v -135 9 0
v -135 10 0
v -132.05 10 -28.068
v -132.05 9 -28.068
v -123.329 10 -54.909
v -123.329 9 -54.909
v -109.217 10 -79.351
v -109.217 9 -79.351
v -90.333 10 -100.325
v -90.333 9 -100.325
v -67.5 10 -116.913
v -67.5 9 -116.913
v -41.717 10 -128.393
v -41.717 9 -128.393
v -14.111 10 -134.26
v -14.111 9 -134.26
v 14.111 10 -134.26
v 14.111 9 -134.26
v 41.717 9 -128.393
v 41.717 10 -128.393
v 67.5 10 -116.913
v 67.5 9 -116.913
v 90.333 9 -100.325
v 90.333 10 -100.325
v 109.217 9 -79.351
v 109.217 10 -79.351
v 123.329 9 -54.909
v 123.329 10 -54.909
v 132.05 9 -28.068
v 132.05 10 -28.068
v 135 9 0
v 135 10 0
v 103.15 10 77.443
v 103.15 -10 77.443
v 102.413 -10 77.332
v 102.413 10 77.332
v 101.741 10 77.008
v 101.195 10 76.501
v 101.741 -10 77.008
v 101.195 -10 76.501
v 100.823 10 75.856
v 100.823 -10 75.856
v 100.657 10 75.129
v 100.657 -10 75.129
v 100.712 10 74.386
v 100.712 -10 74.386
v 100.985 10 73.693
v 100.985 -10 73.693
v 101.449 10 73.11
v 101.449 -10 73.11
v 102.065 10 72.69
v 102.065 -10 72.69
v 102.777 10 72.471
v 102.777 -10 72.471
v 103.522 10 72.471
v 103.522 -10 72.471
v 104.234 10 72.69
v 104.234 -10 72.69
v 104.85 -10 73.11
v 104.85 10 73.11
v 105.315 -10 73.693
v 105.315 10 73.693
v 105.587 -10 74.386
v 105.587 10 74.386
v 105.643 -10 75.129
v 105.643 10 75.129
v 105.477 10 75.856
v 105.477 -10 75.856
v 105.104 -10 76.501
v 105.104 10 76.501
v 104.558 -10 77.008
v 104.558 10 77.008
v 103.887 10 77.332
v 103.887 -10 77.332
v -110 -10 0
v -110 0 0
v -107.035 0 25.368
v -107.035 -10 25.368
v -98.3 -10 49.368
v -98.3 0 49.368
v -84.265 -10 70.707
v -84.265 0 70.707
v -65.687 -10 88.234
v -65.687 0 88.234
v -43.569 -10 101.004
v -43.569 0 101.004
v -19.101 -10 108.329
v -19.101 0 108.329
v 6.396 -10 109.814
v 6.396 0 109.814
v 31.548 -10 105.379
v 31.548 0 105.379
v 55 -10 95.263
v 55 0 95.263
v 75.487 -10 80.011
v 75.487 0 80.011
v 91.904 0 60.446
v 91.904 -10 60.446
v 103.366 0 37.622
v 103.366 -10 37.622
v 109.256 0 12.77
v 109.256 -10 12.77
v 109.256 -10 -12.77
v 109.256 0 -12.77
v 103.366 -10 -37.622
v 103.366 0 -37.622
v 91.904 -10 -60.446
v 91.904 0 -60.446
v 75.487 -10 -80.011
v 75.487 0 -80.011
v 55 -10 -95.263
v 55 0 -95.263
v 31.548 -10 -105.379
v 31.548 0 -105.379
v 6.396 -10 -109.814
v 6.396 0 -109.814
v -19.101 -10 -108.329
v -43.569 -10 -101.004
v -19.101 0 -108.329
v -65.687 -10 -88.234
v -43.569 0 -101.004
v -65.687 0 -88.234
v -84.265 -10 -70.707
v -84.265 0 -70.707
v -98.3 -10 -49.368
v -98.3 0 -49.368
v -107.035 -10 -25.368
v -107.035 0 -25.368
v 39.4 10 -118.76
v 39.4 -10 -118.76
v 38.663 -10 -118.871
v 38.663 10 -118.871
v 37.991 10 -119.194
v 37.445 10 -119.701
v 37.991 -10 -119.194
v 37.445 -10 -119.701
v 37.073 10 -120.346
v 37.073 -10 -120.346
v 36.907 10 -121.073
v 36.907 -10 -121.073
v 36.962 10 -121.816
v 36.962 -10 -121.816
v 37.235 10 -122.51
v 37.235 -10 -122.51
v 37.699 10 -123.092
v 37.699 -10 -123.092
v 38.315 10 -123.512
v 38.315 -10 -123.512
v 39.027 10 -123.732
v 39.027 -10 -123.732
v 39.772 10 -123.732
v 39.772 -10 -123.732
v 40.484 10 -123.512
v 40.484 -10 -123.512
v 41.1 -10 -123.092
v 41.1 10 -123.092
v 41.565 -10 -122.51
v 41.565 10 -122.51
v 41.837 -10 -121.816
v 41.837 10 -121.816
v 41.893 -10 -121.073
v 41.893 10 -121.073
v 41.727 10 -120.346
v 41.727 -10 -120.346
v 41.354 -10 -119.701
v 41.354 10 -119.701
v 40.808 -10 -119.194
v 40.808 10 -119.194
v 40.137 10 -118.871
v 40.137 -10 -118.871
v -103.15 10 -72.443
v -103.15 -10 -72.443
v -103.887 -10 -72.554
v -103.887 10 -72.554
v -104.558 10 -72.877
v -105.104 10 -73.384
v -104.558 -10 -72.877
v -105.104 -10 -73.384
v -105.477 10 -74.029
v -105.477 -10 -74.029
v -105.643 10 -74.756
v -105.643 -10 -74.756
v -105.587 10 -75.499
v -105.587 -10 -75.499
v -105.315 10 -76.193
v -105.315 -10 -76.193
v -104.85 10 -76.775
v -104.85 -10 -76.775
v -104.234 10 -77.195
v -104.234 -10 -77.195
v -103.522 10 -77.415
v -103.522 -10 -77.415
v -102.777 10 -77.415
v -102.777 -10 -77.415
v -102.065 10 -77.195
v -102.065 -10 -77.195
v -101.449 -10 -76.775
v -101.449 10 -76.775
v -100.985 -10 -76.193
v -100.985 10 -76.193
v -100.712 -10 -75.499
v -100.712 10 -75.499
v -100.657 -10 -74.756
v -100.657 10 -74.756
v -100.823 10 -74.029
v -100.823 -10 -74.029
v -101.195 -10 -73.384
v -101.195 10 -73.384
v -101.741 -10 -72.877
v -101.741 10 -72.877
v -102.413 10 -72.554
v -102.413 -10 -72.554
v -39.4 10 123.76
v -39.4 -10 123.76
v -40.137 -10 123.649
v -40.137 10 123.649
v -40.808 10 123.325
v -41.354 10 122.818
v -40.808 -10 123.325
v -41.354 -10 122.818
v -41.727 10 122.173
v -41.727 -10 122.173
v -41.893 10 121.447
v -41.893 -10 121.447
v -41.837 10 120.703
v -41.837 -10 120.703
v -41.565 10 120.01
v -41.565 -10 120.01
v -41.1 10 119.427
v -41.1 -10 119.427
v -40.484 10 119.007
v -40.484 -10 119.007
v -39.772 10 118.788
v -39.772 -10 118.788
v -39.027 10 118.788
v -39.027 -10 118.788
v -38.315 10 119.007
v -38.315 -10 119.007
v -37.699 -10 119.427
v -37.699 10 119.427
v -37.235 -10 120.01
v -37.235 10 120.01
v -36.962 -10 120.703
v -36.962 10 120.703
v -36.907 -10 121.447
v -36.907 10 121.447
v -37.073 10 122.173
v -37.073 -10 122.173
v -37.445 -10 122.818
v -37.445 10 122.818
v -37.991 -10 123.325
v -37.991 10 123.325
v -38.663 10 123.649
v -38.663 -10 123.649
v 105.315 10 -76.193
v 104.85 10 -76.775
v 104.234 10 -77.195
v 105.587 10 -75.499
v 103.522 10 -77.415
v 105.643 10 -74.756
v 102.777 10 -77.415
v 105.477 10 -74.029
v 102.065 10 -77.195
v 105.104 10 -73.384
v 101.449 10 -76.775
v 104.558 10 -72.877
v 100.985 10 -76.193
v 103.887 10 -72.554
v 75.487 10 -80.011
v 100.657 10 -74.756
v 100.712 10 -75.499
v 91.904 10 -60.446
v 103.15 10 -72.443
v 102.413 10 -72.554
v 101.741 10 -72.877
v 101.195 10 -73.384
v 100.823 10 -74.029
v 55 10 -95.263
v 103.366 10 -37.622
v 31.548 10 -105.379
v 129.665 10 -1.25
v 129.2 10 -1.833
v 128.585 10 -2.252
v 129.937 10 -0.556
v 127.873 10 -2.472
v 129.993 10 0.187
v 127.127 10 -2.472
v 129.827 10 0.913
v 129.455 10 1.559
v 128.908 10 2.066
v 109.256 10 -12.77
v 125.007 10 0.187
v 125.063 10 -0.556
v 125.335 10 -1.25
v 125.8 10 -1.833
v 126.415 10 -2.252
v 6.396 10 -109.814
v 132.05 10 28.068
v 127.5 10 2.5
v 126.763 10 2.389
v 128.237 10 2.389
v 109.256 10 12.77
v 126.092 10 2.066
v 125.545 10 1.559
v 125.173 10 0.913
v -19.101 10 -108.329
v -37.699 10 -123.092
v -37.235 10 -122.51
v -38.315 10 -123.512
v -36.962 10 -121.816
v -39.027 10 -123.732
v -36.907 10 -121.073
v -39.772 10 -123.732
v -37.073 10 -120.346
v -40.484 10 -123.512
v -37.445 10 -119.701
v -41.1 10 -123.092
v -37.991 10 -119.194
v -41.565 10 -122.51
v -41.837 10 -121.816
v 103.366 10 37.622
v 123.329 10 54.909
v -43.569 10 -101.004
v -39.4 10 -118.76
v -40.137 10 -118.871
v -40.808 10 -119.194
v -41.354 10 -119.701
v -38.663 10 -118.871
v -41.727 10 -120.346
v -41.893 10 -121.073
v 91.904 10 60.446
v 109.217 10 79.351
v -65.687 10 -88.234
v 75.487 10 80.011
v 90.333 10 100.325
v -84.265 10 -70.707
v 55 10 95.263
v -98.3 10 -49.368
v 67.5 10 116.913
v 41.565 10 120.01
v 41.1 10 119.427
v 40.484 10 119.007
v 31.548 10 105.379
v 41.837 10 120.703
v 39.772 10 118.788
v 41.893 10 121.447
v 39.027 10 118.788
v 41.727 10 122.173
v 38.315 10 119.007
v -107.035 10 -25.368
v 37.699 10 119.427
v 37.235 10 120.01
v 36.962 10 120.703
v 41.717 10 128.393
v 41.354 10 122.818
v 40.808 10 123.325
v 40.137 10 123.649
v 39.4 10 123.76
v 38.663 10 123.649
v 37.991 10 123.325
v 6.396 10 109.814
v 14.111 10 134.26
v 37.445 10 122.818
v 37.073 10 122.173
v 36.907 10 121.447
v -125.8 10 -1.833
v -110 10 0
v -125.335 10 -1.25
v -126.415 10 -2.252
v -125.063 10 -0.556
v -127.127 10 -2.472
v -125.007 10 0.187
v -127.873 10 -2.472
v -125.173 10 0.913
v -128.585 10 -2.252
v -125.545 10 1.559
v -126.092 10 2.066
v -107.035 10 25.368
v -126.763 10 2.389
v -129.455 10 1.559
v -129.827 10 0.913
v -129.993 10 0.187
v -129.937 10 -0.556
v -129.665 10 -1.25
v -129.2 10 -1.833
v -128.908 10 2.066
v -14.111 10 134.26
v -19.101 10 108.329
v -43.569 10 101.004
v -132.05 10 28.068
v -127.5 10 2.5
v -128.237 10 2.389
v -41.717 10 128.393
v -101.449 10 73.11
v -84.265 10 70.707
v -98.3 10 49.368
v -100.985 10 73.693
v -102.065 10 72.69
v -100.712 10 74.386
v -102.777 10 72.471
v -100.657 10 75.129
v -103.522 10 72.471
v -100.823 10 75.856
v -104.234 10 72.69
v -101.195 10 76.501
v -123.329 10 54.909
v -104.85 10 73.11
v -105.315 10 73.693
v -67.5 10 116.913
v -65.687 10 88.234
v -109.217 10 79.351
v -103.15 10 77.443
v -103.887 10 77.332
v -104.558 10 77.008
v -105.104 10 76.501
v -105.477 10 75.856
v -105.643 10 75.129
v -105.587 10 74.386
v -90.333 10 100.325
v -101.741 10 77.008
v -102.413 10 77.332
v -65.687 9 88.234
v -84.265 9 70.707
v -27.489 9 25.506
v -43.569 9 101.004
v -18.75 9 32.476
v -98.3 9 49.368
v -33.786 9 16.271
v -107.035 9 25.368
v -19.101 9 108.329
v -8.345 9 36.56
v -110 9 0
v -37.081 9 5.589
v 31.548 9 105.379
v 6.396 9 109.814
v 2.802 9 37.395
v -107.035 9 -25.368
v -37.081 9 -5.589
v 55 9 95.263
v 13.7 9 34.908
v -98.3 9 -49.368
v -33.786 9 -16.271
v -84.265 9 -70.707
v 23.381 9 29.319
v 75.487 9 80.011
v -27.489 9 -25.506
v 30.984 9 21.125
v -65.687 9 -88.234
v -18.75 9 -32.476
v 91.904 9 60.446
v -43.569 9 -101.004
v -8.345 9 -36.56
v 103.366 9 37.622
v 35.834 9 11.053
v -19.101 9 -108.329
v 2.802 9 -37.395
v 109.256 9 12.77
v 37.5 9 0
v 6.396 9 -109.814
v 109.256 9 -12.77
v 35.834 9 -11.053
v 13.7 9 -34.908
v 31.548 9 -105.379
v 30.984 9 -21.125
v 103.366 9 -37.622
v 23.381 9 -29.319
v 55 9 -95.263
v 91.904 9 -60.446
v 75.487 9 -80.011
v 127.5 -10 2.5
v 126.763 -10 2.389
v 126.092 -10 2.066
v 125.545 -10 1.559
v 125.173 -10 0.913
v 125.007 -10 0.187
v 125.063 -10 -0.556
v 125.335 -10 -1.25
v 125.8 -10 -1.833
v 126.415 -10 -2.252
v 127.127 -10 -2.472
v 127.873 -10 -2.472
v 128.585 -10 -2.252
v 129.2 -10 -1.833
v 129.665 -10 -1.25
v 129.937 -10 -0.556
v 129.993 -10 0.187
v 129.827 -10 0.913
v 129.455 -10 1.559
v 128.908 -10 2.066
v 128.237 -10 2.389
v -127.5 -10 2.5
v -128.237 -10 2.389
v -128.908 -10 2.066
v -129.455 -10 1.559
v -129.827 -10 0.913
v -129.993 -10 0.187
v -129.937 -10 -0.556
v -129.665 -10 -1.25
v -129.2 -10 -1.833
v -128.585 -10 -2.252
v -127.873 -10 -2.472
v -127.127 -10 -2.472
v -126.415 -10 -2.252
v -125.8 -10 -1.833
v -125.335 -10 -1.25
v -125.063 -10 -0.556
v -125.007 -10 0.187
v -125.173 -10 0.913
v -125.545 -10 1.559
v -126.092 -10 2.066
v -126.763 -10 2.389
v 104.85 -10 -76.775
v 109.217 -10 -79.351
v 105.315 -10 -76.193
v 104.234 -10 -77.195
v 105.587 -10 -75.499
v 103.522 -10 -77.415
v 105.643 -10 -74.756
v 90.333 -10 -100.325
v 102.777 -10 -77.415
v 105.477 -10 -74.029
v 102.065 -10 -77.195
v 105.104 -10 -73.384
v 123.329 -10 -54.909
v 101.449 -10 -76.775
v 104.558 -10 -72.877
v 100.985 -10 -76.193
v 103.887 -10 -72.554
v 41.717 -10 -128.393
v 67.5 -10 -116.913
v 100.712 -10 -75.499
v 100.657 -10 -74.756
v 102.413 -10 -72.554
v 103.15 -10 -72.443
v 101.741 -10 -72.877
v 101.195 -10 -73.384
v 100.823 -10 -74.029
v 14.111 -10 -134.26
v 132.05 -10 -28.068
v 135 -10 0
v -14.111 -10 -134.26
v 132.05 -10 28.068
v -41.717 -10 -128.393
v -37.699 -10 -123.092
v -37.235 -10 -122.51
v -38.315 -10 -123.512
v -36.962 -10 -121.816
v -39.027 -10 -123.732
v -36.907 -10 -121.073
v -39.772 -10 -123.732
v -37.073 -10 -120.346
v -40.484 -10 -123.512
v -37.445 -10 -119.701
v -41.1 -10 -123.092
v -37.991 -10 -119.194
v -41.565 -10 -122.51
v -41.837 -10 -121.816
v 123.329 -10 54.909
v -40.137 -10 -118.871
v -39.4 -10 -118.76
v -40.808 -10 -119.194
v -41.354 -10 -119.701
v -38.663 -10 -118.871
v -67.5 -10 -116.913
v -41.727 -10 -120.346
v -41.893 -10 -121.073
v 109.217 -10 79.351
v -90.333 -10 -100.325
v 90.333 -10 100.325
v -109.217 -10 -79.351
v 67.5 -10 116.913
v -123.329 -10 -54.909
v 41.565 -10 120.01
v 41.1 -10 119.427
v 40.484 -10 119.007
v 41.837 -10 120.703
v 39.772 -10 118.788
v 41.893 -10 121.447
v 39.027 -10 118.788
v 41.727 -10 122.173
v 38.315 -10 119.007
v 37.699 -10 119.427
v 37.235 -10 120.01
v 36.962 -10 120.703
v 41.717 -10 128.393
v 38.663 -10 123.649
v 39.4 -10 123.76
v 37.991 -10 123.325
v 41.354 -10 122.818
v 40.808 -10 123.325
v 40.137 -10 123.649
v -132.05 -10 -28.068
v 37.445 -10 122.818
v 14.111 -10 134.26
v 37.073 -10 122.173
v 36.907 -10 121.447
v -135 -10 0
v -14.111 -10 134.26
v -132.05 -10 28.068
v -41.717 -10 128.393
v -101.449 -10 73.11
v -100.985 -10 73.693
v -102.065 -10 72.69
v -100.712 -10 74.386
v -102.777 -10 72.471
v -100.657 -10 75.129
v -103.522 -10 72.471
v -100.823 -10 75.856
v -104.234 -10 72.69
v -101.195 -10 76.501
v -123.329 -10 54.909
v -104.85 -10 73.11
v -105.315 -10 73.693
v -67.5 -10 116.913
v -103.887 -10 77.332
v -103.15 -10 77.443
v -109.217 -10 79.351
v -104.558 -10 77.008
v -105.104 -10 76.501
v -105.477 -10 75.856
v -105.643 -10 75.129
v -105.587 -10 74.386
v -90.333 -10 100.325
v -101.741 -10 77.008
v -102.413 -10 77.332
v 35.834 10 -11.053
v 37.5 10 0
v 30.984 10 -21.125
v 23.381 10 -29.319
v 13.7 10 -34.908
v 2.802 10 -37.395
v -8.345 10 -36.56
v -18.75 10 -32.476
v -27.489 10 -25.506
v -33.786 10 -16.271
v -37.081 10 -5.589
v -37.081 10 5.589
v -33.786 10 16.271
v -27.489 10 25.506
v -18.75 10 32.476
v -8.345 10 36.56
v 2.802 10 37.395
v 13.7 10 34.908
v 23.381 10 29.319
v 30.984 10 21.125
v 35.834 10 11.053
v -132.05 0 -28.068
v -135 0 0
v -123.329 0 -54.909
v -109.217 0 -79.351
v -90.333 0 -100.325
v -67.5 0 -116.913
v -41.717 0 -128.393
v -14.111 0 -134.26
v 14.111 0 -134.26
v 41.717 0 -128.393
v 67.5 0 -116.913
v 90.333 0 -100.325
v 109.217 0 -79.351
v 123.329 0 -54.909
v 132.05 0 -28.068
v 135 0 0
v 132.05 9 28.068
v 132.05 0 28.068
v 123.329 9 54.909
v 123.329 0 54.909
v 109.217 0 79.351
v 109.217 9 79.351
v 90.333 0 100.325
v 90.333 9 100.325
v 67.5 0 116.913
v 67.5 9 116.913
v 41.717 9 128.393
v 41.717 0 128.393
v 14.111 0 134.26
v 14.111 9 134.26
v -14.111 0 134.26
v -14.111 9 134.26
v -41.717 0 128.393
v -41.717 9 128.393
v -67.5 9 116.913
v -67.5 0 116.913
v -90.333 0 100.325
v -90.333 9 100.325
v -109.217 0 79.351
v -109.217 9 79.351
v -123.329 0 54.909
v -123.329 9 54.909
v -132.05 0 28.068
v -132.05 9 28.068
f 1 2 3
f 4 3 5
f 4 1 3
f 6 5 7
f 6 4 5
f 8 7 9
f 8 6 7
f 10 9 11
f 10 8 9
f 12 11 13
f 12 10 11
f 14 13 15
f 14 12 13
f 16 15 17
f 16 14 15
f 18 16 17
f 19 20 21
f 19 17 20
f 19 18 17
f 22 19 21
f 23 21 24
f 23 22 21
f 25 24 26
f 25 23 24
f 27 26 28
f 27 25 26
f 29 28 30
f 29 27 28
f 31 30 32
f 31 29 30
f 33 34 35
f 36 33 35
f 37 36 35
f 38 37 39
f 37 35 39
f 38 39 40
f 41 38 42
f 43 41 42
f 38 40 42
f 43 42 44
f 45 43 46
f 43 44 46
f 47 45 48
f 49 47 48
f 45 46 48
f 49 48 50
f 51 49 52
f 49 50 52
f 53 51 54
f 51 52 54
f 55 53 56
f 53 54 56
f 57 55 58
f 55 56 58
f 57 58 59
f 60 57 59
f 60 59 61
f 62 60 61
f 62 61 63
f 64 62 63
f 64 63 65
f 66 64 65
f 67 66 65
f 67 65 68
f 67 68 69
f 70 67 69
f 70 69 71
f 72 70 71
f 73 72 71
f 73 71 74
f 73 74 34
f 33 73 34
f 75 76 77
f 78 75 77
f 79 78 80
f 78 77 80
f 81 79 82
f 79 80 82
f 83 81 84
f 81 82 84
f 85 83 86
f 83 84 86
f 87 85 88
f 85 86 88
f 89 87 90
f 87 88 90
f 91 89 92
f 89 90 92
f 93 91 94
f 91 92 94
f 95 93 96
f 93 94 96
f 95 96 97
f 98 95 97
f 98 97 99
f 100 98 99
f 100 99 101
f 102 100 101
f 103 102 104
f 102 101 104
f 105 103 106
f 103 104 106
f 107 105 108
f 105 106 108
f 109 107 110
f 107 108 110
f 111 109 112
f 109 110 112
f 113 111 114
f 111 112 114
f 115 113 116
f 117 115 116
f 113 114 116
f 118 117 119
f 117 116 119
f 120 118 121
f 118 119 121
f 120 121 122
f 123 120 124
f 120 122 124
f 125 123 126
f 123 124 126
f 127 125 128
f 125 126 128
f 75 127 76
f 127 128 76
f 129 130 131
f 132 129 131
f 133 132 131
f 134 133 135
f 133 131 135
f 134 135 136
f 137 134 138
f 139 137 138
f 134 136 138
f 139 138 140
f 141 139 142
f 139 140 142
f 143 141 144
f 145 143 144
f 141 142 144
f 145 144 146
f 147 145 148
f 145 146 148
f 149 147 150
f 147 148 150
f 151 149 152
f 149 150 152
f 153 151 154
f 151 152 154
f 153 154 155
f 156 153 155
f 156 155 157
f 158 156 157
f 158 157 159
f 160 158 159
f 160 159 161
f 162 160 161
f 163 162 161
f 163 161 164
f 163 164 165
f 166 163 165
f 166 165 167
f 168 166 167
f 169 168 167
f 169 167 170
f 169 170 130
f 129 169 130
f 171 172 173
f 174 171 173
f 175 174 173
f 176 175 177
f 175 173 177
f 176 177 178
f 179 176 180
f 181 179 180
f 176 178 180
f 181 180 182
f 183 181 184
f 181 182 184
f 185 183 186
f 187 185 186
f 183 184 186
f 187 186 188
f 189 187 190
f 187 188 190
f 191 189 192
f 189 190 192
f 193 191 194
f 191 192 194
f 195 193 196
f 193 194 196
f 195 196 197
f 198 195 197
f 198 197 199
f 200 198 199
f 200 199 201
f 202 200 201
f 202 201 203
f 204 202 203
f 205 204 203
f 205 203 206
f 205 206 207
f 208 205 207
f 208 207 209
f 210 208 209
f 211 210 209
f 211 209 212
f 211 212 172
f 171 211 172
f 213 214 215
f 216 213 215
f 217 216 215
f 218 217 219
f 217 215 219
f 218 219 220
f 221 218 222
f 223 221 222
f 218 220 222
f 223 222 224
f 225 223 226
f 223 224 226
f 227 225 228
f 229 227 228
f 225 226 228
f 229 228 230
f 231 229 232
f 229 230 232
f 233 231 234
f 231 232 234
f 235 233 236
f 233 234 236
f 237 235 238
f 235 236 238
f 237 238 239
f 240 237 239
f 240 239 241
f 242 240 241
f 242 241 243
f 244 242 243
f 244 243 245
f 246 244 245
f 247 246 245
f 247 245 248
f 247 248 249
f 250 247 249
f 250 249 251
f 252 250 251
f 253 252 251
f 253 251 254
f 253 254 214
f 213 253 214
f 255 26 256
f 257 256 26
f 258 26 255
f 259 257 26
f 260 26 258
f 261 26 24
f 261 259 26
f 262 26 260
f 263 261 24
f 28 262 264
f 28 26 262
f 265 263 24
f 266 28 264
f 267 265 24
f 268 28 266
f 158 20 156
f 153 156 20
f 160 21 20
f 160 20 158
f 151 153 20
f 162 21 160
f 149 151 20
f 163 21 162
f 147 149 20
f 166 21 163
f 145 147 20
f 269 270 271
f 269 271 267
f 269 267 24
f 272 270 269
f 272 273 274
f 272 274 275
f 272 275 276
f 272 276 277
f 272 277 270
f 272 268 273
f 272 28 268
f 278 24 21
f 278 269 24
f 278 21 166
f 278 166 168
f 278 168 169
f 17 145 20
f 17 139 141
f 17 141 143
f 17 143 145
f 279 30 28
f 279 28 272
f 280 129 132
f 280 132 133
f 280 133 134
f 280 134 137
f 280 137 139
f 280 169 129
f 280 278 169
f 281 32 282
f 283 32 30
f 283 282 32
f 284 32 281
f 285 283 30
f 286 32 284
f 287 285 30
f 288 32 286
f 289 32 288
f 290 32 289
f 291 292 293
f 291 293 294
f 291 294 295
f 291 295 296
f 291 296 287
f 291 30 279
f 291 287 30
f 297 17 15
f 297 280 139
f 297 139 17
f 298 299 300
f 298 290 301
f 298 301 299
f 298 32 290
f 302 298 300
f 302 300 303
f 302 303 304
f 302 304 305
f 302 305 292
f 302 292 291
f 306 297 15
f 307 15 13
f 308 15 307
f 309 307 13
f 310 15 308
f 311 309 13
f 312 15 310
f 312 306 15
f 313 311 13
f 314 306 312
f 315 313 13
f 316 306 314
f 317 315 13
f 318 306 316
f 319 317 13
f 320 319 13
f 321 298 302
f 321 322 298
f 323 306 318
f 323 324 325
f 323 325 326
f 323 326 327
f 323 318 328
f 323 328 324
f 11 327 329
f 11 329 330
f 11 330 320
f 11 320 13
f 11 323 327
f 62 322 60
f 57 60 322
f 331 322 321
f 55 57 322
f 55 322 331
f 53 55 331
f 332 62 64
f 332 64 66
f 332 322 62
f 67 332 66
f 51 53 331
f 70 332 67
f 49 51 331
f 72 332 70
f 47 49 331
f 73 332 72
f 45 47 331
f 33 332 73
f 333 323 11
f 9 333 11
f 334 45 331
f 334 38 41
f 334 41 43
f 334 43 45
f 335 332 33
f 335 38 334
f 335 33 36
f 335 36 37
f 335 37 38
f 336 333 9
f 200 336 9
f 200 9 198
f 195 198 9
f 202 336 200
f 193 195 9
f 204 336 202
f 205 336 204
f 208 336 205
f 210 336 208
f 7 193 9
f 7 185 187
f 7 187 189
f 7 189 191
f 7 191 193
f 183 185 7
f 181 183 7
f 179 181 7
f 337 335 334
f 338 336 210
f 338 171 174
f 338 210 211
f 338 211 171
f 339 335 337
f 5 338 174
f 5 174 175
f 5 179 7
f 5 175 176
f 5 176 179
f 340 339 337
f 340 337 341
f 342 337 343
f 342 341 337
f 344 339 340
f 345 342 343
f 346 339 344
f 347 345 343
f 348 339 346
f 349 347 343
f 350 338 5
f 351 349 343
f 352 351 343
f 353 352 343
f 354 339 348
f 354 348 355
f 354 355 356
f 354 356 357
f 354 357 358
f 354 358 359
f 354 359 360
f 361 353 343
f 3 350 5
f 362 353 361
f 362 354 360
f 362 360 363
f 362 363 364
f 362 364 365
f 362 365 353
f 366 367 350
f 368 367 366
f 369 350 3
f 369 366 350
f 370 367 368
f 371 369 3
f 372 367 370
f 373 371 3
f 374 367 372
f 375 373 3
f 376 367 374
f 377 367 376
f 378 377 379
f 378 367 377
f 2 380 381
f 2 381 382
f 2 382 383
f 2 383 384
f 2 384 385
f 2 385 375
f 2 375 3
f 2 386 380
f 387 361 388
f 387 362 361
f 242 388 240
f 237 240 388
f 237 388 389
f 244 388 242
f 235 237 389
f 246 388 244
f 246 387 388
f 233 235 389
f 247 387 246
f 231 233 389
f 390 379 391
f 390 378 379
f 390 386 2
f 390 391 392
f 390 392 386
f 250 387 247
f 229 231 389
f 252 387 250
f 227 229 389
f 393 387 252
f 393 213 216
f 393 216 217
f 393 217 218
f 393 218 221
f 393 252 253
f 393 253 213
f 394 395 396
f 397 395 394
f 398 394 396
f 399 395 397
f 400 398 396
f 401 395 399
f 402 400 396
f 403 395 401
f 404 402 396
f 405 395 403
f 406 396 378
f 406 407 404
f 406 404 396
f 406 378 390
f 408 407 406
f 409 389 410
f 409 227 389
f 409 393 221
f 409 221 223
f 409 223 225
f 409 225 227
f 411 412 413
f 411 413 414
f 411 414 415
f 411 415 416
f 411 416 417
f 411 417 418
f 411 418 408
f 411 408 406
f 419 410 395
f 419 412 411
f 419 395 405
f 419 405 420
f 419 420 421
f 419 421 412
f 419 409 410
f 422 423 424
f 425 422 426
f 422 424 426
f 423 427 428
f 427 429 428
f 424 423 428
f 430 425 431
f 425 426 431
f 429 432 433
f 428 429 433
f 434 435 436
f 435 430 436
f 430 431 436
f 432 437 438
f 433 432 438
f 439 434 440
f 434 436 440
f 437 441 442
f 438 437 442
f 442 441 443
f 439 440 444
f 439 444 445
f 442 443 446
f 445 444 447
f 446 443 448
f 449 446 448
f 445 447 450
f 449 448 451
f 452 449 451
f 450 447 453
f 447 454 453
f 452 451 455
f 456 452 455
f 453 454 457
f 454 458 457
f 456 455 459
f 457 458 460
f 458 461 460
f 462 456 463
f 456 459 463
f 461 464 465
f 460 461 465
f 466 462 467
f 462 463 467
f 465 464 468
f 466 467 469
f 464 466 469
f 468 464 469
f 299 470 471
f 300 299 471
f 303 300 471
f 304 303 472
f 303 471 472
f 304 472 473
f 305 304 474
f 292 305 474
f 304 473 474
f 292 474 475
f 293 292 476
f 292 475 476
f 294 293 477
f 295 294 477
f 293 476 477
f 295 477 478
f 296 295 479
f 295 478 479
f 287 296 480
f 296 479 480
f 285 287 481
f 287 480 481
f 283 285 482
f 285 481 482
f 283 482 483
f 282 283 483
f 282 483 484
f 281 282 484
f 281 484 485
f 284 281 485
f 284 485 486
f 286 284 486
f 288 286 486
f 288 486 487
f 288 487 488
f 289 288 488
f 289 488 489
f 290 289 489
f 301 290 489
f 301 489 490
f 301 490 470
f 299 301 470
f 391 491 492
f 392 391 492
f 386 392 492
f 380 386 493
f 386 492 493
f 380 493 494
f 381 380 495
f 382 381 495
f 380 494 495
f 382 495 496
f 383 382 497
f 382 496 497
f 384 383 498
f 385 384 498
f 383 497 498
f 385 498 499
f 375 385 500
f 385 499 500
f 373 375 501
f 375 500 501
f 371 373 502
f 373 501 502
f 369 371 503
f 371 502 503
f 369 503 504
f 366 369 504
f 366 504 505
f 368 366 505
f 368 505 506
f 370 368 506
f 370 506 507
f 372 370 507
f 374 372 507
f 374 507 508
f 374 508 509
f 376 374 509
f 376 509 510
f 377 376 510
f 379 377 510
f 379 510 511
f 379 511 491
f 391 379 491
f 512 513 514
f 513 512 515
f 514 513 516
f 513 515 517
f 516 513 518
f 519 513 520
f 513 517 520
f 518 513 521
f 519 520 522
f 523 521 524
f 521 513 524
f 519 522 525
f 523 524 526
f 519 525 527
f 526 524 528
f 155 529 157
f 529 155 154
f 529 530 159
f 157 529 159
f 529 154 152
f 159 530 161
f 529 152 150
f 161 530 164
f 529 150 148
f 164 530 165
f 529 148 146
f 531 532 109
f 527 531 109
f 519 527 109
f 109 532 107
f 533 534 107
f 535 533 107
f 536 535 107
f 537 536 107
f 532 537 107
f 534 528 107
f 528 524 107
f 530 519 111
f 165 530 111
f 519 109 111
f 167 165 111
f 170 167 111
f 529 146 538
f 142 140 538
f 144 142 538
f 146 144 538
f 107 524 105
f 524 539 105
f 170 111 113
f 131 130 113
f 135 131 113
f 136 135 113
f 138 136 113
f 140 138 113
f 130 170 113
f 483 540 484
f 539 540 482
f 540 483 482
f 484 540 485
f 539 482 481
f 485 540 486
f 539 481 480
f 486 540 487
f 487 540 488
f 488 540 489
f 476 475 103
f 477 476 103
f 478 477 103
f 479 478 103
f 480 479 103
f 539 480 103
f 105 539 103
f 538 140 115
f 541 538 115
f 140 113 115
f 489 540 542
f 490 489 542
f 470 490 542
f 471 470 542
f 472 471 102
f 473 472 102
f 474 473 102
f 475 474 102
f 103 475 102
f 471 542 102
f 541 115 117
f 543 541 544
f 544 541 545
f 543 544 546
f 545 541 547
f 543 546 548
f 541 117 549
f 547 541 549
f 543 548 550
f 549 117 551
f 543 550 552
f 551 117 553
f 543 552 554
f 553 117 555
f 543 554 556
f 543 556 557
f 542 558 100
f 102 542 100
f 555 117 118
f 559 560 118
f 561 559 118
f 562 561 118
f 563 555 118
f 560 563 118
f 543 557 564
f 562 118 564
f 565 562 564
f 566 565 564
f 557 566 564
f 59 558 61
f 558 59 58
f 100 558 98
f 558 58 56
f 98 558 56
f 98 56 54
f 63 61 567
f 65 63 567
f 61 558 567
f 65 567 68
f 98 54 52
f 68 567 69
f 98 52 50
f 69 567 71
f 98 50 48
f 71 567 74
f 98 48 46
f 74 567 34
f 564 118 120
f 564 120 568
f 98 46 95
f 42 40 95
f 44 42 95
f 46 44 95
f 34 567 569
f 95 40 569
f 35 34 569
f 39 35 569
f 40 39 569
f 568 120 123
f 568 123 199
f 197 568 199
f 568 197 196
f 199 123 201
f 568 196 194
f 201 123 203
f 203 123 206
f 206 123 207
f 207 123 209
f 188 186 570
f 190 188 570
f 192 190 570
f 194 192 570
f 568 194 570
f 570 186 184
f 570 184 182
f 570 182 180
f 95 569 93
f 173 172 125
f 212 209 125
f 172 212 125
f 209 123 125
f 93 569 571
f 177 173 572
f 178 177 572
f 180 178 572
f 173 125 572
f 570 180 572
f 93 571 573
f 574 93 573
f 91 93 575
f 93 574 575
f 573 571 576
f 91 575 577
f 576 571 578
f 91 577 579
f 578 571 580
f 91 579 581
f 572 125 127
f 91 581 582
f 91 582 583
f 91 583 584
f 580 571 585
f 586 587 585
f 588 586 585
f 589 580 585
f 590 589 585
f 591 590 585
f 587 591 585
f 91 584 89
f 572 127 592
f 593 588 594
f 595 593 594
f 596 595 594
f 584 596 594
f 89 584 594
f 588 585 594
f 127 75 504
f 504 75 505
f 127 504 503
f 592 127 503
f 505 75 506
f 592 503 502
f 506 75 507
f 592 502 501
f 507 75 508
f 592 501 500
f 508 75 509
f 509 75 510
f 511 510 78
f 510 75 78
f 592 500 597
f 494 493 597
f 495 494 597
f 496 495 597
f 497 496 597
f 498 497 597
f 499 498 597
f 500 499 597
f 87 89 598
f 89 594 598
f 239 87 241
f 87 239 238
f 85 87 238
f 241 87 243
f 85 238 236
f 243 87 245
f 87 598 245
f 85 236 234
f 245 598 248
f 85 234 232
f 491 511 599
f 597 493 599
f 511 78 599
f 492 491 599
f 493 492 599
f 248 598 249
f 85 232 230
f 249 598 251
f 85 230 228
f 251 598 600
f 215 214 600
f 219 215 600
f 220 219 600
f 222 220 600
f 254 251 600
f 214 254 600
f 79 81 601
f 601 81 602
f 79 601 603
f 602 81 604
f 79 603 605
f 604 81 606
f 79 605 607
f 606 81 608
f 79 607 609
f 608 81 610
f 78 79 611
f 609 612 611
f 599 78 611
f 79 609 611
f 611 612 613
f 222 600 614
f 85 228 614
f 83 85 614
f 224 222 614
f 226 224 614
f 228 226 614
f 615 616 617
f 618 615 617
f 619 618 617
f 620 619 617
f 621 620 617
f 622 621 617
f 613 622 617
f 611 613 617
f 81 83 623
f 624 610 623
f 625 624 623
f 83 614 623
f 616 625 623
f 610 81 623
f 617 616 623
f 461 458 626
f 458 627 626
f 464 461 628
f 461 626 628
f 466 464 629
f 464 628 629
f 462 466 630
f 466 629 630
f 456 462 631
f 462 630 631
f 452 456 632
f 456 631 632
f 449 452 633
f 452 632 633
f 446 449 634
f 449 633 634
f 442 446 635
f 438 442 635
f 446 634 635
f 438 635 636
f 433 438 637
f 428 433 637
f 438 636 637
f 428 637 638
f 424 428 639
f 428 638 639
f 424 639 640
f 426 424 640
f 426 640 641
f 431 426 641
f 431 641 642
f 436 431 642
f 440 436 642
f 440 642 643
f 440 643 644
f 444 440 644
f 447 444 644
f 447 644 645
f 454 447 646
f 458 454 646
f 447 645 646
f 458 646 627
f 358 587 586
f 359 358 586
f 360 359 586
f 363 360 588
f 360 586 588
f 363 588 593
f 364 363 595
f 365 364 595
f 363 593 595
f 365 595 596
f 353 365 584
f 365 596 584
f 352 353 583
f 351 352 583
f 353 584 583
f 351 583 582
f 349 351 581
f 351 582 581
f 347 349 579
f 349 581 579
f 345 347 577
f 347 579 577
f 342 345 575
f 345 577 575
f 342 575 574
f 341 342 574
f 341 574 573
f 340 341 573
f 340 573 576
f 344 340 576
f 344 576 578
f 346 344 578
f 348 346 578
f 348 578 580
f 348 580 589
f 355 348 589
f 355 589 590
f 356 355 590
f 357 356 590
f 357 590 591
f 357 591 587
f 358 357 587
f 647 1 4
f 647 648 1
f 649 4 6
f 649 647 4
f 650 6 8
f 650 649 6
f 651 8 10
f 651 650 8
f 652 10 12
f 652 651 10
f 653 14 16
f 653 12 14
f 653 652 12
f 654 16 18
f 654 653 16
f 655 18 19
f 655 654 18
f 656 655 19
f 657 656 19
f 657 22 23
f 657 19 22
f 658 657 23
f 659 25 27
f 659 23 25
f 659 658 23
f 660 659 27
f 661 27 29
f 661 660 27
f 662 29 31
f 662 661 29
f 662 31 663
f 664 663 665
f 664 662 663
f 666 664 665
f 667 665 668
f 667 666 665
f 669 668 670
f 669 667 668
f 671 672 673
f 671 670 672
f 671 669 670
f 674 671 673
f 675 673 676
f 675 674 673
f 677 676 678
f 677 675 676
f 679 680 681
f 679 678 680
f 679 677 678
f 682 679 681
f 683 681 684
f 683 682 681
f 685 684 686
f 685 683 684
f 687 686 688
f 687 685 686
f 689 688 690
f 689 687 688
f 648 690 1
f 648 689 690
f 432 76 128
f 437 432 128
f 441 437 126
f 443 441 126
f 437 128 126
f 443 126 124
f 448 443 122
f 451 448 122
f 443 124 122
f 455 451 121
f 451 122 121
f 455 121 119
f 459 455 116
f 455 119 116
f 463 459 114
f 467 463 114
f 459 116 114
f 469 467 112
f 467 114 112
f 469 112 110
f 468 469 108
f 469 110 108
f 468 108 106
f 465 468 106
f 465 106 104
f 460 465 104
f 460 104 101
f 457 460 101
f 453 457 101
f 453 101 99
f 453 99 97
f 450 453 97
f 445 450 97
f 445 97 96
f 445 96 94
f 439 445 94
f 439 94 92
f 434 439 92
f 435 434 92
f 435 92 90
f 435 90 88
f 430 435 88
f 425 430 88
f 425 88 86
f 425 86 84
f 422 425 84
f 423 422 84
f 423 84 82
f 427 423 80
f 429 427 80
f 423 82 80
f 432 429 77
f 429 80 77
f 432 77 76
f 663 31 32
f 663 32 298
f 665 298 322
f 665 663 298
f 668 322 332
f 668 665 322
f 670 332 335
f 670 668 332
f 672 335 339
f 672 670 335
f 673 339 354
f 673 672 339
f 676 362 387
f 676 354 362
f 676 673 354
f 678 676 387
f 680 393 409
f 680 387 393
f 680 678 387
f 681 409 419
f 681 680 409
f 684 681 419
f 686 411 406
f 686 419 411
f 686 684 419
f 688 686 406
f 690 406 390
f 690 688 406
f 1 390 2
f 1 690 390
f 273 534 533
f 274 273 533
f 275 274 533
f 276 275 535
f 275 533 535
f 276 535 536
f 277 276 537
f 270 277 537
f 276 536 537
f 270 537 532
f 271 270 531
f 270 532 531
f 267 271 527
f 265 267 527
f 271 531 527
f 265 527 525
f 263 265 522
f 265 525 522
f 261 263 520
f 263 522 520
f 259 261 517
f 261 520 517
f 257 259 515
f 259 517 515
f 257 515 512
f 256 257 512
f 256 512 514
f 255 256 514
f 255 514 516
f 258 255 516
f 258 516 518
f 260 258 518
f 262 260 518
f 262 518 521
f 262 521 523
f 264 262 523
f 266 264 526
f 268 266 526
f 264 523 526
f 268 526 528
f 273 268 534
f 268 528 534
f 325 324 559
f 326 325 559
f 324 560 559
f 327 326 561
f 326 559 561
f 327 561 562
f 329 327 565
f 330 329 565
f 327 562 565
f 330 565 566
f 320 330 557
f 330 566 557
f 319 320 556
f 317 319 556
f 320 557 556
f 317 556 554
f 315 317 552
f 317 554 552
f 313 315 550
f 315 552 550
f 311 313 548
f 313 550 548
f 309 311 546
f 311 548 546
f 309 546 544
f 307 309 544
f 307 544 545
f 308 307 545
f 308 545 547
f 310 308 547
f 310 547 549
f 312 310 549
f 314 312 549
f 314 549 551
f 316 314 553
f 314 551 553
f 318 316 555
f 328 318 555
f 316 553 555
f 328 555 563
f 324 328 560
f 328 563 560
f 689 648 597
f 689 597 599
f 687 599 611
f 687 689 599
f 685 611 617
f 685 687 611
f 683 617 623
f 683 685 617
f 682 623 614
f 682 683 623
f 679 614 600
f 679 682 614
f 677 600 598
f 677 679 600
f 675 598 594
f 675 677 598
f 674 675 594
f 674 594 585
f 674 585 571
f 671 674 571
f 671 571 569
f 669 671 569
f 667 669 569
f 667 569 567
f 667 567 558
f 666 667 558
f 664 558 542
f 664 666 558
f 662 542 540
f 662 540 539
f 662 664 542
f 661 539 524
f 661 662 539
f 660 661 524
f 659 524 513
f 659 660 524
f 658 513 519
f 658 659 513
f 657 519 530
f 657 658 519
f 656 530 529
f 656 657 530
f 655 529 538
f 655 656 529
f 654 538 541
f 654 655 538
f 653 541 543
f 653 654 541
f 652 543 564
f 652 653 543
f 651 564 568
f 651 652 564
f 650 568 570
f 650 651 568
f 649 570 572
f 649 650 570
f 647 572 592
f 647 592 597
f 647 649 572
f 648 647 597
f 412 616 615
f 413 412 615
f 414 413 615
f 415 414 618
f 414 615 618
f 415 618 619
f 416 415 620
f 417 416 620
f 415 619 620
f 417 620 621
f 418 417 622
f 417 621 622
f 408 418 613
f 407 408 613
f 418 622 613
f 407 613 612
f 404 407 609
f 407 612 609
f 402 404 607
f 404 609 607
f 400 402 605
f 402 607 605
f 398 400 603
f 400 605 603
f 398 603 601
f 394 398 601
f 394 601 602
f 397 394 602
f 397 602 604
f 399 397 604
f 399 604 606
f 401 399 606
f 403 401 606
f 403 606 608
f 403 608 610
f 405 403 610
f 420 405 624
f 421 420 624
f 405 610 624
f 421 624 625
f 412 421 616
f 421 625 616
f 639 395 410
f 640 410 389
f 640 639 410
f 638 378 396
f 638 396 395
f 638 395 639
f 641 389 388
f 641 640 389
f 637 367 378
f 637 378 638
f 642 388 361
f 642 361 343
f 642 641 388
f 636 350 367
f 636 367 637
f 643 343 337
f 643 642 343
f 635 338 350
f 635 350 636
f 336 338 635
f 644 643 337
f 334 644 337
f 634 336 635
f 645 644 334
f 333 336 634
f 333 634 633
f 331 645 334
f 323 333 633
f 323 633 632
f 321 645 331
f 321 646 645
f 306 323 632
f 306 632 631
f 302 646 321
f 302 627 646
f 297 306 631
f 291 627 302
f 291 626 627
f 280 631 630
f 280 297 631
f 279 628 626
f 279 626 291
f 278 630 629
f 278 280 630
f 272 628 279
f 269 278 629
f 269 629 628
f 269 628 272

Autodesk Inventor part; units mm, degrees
ref_plane "YZ Plane" through (0, 0, 0) normal (1, 0, 0) x (0, 1, 0)
ref_plane "XZ Plane" through (0, 0, 0) normal (0, 1, 0) x (-1, 0, 0)
ref_plane "XY Plane" through (0, 0, 0) normal (0, 0, 1) x (1, 0, 0)
sketch "Sketch1" plane through (0, 0, 0) normal (0, 1, 0) x (-1, 0, 0)
  circle A0 centre (0, 0) radius 135
  circle A1 centre (0, 0) radius 110
  dimension "d0" = 270
  dimension "d1" = 220
extrude "Extrusion1" add sketch "Sketch1" along normal mid plane 20
sketch "Sketch2" plane through (0, 10, 0) normal (0, 1, 0) x (1, 0, 0)
  circle A0 centre (0, 0) radius 37.5
  circle A1 centre (0, 0) radius 135
  dimension "d4" = 75
  dimension "d20" = 270
extrude "Extrusion2" add sketch "Sketch2" against normal blind 1
sketch "Sketch3" plane through (0, 10, 0) normal (0, 1, 0) x (1, 0, 0)
  circle A0 centre (0, 0) radius 127.5
  circle A1 centre (127.5, 0) radius 2.5
  circle A2 centre (103.1497, 74.9426) radius 2.5
  circle A3 centre (39.3997, 121.2597) radius 2.5
  circle A4 centre (-39.3997, 121.2597) radius 2.5
  circle A5 centre (-103.1497, 74.9426) radius 2.5
  circle A6 centre (-127.5, 0) radius 2.5
  circle A7 centre (-103.1497, -74.9426) radius 2.5
  circle A8 centre (-39.3997, -121.2597) radius 2.5
  circle A9 centre (39.3997, -121.2597) radius 2.5
  circle A10 centre (103.1497, -74.9426) radius 2.5
  dimension "d7" = 255
  dimension "d8" = 5
  dimension "d11" = 360
hole "Hole1" at (127.5, 10, 0) at (103.1497, 10, 74.9426) at (39.3997, 10, 121.2597) at (-39.3997, 10, 121.2597) at (-103.1497, 10, 74.9426) at (-127.5, 10, 0) at (-103.1497, 10, -74.9426) at (-39.3997, 10, -121.2597) at (39.3997, 10, -121.2597) at (103.1497, 10, -74.9426) direction (0, -1, 0) diameter 5 end through all
properties part number "Cylinder Spacer 25mm"
